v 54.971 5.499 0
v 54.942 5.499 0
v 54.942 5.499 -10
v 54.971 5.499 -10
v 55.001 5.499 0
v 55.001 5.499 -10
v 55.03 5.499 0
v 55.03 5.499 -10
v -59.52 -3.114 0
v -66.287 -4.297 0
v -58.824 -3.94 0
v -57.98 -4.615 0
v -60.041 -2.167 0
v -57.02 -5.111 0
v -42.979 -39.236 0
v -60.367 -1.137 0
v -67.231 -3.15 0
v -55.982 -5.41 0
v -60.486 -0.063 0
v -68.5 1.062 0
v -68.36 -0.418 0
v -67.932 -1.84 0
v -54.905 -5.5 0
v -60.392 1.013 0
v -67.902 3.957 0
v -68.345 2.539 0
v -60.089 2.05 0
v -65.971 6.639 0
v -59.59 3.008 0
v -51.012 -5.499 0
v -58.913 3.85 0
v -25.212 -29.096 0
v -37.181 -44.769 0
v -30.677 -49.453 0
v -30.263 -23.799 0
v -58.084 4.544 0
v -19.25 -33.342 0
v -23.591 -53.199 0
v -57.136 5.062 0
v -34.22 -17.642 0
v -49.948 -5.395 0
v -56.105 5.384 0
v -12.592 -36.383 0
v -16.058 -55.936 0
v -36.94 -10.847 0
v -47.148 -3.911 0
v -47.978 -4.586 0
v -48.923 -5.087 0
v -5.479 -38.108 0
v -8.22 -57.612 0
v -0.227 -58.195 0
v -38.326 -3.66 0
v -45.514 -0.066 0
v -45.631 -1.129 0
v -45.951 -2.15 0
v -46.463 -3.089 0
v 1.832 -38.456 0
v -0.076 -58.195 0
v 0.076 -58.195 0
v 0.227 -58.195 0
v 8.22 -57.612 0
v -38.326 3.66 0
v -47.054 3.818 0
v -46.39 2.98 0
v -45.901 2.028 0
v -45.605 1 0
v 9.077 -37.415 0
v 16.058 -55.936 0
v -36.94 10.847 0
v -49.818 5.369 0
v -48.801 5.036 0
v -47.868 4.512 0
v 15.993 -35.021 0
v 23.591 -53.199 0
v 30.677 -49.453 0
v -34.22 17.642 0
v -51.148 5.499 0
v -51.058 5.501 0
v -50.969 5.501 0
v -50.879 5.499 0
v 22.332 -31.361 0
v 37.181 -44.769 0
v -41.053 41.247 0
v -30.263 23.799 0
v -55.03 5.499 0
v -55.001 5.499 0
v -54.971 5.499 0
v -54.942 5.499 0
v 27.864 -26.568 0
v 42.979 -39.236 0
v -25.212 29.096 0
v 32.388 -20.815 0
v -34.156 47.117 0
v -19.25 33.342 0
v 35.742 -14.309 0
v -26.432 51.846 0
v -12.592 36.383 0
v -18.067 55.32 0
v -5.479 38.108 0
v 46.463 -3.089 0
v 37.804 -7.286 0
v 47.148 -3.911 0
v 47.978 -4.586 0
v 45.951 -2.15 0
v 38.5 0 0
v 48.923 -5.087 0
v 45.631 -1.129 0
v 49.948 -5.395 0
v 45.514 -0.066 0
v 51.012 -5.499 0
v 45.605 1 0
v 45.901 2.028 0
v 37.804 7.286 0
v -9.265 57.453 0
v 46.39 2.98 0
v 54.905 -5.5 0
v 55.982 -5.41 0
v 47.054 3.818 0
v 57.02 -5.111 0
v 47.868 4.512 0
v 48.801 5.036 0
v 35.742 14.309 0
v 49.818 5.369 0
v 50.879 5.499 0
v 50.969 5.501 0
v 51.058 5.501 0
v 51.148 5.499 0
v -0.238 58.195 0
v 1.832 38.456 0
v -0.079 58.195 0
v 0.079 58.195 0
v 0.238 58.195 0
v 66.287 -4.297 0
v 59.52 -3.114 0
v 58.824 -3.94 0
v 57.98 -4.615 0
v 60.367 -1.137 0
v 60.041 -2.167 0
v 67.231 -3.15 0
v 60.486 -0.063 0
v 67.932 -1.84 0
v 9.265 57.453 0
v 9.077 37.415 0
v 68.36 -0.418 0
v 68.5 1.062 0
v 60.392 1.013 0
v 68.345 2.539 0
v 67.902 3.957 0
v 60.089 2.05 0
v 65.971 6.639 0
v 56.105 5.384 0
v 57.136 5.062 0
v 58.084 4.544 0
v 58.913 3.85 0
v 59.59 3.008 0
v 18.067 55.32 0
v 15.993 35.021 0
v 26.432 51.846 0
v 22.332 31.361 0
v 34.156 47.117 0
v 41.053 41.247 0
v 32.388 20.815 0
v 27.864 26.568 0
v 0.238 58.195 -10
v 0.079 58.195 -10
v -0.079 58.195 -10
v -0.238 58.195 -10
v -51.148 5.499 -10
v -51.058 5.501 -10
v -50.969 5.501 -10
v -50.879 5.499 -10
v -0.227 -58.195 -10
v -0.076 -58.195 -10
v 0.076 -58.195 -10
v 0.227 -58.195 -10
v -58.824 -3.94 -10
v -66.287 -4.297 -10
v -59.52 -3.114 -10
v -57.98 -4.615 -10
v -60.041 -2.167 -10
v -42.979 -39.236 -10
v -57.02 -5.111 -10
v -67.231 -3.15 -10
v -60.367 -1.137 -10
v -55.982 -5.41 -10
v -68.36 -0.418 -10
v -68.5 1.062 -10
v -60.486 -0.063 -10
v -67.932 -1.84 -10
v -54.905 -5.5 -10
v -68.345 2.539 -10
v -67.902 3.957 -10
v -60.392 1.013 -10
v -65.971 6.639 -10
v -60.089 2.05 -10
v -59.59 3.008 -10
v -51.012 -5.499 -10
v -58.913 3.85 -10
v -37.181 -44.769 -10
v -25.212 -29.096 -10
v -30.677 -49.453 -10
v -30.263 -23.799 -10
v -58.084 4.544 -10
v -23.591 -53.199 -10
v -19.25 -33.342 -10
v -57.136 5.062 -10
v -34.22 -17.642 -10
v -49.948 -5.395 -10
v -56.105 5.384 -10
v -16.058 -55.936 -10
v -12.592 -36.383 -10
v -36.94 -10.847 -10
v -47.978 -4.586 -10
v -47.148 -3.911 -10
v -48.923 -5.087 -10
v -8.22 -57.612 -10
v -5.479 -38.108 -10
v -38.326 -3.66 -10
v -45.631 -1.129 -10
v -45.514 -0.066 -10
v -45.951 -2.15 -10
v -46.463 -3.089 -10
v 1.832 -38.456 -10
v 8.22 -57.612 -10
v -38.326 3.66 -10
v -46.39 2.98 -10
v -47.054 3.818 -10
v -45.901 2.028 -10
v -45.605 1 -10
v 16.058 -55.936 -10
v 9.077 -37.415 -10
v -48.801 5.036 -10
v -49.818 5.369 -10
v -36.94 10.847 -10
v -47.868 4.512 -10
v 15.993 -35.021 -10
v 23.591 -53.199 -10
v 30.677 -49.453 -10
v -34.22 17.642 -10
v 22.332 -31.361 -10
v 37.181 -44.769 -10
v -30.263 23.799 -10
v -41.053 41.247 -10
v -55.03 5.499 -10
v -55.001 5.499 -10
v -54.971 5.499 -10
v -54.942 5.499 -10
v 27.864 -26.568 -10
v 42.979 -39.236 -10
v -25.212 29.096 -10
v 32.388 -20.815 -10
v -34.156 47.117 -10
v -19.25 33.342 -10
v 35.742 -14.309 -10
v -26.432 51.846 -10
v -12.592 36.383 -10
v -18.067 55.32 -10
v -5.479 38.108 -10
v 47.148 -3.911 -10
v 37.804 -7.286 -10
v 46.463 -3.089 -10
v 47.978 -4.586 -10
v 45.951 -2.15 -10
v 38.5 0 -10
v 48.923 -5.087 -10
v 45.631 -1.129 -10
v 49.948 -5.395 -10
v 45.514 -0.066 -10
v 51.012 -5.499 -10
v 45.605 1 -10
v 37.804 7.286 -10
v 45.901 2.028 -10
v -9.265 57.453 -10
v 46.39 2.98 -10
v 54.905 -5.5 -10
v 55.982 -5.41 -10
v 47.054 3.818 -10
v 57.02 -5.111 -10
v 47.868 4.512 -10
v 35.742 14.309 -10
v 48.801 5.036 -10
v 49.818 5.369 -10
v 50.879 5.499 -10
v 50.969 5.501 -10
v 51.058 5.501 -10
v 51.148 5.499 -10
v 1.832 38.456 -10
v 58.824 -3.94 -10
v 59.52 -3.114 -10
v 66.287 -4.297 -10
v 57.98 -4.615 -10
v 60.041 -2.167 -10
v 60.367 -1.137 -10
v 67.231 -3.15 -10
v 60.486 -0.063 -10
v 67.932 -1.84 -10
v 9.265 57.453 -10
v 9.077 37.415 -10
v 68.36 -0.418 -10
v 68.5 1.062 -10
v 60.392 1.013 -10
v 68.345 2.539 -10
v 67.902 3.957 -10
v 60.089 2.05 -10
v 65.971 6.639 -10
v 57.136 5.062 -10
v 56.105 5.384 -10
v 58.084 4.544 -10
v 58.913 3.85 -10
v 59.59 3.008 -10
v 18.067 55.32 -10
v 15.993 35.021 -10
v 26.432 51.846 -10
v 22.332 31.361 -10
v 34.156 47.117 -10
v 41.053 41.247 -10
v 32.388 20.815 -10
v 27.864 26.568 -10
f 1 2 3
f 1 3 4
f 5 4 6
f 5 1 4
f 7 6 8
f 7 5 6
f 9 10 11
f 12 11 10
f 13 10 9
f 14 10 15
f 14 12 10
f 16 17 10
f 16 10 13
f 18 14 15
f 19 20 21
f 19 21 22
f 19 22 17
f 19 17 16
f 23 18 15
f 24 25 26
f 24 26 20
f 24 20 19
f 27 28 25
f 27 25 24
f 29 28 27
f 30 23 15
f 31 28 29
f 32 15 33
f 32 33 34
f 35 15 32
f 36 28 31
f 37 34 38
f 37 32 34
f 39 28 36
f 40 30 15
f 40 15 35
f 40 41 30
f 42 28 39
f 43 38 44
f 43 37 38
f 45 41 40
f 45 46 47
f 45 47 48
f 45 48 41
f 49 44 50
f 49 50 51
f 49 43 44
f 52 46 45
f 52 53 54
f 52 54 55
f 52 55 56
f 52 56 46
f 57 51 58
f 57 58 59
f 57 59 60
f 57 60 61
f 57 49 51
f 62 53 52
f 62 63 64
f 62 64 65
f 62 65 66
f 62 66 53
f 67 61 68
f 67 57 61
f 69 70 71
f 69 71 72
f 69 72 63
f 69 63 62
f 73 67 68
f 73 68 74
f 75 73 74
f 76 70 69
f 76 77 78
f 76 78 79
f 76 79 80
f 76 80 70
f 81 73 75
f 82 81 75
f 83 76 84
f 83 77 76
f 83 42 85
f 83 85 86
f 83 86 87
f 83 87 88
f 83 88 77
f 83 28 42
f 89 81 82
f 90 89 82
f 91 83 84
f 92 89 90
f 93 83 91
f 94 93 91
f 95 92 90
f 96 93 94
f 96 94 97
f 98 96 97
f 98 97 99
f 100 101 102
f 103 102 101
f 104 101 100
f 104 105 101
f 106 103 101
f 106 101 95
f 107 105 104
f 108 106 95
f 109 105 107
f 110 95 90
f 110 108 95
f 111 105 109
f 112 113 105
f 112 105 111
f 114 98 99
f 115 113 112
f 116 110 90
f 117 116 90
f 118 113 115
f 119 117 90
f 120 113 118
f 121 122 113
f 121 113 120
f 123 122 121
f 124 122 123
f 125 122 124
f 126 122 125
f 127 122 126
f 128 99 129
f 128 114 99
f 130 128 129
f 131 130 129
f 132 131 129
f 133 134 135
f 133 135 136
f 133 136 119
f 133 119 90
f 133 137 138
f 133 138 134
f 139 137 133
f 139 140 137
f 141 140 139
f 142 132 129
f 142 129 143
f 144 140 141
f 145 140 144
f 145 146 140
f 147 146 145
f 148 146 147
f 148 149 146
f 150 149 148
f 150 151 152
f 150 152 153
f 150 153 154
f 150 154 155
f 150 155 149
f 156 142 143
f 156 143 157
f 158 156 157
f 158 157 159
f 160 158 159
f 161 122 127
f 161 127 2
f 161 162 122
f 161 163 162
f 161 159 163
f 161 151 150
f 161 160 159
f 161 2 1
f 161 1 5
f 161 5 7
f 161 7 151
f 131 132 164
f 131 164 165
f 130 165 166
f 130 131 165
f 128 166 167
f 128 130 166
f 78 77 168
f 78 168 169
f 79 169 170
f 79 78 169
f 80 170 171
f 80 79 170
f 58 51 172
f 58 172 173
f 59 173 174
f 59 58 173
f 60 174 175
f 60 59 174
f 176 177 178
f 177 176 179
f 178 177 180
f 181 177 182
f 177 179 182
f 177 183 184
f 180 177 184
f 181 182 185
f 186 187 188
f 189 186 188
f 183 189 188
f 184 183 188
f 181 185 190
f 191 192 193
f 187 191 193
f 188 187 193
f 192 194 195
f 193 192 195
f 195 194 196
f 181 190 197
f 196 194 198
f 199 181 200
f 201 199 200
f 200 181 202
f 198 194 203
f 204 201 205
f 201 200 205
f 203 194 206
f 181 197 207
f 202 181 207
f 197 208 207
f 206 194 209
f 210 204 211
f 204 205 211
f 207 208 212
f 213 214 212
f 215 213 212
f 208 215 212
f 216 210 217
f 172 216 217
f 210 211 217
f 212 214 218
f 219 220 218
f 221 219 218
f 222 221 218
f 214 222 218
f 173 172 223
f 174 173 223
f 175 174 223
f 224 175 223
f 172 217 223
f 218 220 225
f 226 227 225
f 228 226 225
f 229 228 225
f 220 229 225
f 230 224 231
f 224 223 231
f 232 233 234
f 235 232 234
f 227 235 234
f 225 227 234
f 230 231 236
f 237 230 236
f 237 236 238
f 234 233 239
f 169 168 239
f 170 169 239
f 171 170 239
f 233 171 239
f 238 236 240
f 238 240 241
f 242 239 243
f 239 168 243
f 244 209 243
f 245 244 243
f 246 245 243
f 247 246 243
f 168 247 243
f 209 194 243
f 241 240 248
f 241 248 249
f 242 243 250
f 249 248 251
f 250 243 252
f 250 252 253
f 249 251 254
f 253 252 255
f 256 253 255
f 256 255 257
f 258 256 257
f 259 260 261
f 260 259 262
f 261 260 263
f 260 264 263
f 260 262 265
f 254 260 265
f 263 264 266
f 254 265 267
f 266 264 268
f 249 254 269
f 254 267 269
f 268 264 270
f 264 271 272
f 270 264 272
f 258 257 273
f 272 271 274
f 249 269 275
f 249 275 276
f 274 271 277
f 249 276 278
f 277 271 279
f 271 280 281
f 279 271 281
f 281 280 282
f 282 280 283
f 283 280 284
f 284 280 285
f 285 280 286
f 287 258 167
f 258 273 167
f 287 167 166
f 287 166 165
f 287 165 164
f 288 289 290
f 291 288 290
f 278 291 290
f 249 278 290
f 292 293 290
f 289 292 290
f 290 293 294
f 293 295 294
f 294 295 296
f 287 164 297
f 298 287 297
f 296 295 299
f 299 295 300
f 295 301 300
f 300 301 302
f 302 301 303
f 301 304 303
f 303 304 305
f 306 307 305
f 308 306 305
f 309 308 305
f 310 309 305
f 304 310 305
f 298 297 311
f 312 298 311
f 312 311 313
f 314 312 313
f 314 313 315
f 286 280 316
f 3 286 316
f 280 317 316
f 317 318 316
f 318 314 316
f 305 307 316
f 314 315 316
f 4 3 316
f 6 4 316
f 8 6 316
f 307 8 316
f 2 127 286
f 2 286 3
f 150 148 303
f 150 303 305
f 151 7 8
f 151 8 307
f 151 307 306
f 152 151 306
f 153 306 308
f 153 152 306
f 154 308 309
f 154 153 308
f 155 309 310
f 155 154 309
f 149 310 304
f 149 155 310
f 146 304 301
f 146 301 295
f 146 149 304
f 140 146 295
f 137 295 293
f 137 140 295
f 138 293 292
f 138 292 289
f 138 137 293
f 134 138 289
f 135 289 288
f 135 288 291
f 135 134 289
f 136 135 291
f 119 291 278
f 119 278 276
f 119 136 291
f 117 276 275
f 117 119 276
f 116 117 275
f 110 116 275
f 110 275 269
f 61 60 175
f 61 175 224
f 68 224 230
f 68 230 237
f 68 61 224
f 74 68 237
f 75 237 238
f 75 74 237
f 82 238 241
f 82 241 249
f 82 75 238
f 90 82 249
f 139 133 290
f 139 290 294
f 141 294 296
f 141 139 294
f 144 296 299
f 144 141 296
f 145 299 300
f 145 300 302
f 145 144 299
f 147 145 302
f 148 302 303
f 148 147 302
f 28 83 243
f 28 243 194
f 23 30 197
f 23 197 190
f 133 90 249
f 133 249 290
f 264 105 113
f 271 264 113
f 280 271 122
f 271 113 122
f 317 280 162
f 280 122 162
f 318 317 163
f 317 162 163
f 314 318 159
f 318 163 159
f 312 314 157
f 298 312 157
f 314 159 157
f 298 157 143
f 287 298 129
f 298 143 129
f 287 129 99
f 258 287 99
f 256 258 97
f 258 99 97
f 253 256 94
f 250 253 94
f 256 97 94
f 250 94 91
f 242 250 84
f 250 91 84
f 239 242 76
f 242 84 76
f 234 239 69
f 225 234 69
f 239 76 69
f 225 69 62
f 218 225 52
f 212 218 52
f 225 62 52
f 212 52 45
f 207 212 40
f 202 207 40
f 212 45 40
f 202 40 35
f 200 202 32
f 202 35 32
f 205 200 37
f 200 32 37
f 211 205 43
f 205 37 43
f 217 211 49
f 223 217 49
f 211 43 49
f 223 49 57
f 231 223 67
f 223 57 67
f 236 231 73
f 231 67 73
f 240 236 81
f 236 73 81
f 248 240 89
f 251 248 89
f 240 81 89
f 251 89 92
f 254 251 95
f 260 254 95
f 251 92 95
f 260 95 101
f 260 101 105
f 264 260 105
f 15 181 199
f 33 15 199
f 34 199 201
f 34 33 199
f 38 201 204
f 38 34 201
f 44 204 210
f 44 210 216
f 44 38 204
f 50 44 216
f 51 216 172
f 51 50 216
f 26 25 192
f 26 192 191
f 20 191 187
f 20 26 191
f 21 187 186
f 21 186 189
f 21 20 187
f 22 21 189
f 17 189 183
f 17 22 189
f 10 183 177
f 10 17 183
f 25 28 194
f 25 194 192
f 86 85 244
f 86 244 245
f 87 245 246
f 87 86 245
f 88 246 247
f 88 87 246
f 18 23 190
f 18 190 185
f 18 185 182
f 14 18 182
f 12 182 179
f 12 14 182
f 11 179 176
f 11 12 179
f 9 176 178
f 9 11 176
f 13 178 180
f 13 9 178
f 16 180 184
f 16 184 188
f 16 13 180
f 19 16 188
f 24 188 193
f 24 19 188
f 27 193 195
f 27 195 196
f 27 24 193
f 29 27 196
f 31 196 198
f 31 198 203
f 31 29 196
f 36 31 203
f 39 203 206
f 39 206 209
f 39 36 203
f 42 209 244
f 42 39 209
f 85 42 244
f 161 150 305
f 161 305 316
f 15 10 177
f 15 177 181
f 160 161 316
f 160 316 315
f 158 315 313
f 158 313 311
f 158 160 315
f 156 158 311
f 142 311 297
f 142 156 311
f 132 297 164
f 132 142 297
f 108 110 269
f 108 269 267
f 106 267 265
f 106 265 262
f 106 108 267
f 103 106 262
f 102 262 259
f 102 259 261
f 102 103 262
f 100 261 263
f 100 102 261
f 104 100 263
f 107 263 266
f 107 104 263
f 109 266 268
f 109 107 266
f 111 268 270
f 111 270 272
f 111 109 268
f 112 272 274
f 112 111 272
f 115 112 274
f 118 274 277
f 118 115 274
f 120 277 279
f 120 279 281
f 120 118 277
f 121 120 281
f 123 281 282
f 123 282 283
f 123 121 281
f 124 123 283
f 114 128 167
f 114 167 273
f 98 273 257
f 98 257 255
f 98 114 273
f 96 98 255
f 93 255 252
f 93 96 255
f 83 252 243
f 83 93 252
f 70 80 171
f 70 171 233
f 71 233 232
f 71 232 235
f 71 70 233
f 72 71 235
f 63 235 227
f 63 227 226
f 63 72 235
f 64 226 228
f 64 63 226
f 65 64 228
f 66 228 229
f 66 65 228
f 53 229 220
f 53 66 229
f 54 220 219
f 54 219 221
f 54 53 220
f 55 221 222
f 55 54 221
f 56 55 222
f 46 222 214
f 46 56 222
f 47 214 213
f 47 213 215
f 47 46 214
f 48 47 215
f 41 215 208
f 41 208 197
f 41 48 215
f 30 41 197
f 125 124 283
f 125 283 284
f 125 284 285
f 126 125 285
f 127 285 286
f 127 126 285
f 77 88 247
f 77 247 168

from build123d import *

# Parameters (mm, degrees)
F0_R     = 38.5
F1_DEPTH = 10


# Not quite as in the source:
# - a feature names something its author has since deleted; it is built from what else it names


with BuildPart() as f1:
    # F0 (on Top) → F1 (new body)
    with BuildSketch(Plane.XY):
        with BuildLine():
            Line((-66.2866235273, -4.2965270375), (-42.9791214207, -39.2359080502))
            ThreePointArc((-42.9791214207, -39.2359080502), (-23.5911513271, -53.1988621842), (-0.226643991, -58.1945873009))
            ThreePointArc((-0.226643991, -58.1945873009), (0, -58.1950286418), (0.226643991, -58.1945873009))
            ThreePointArc((0.226643991, -58.1945873009), (23.5911513271, -53.1988621842), (42.9791214207, -39.2359080502))
            Line((42.9791214207, -39.2359080502), (66.2866235273, -4.2965270375))
            ThreePointArc((66.2866235273, -4.2965270375), (68.3602831702, -0.4175146073), (67.9024238921, 3.9570901325))
            Line((67.9024238921, 3.9570901325), (65.9713692122, 6.6390455982))
            Line((65.9713692122, 6.6390455982), (41.053212855, 41.2467583321))
            ThreePointArc((41.053212855, 41.2467583321), (22.3169041562, 53.7458570265), (0.2378206695, 58.1945426991))
            ThreePointArc((0.2378206695, 58.1945426991), (0, 58.1950286418), (-0.2378206695, 58.1945426991))
            ThreePointArc((-0.2378206695, 58.1945426991), (-22.3169041562, 53.7458570265), (-41.053212855, 41.2467583321))
            Line((-41.053212855, 41.2467583321), (-65.9713692122, 6.6390455982))
            Line((-65.9713692122, 6.6390455982), (-67.9024238921, 3.9570901325))
            ThreePointArc((-67.9024238921, 3.9570901325), (-68.3602831702, -0.4175146073), (-66.2866235273, -4.2965270375))
        make_face()
        with BuildLine():
            ThreePointArc((-55.0301875187, 5.4990596786), (-54.9860185236, 5.499237036), (-54.9418495285, 5.4990596786))
            Line((-54.9418495285, 5.4990596786), (-51.1476298855, 5.4990596786))
            ThreePointArc((-51.1476298855, 5.4990596786), (-51.013562259, 5.500693933), (-50.8794946326, 5.4990596786))
            ThreePointArc((-50.8794946326, 5.4990596786), (-45.5139634735, -0.065737976), (-51.0123484011, -5.499305933))
            Line((-51.0123484011, -5.499305933), (-54.9049202804, -5.5001650292))
            ThreePointArc((-54.9049202804, -5.5001650292), (-60.4856618743, -0.0633969362), (-55.0301875187, 5.4990596786))
        make_face(mode=Mode.SUBTRACT)
        Circle(F0_R, mode=Mode.SUBTRACT)
        with BuildLine():
            ThreePointArc((55.0301875187, 5.4990596786), (60.4856618743, -0.0633969362), (54.9049202804, -5.5001650292))
            Line((54.9049202804, -5.5001650292), (51.0123484011, -5.499305933))
            ThreePointArc((51.0123484011, -5.499305933), (45.5139634735, -0.065737976), (50.8794946326, 5.4990596786))
            ThreePointArc((50.8794946326, 5.4990596786), (51.013562259, 5.500693933), (51.1476298855, 5.4990596786))
            Line((51.1476298855, 5.4990596786), (54.9418495285, 5.4990596786))
            ThreePointArc((54.9418495285, 5.4990596786), (54.9860185236, 5.499237036), (55.0301875187, 5.4990596786))
        make_face(mode=Mode.SUBTRACT)
    extrude(amount=-F1_DEPTH)


solid = f1.part
